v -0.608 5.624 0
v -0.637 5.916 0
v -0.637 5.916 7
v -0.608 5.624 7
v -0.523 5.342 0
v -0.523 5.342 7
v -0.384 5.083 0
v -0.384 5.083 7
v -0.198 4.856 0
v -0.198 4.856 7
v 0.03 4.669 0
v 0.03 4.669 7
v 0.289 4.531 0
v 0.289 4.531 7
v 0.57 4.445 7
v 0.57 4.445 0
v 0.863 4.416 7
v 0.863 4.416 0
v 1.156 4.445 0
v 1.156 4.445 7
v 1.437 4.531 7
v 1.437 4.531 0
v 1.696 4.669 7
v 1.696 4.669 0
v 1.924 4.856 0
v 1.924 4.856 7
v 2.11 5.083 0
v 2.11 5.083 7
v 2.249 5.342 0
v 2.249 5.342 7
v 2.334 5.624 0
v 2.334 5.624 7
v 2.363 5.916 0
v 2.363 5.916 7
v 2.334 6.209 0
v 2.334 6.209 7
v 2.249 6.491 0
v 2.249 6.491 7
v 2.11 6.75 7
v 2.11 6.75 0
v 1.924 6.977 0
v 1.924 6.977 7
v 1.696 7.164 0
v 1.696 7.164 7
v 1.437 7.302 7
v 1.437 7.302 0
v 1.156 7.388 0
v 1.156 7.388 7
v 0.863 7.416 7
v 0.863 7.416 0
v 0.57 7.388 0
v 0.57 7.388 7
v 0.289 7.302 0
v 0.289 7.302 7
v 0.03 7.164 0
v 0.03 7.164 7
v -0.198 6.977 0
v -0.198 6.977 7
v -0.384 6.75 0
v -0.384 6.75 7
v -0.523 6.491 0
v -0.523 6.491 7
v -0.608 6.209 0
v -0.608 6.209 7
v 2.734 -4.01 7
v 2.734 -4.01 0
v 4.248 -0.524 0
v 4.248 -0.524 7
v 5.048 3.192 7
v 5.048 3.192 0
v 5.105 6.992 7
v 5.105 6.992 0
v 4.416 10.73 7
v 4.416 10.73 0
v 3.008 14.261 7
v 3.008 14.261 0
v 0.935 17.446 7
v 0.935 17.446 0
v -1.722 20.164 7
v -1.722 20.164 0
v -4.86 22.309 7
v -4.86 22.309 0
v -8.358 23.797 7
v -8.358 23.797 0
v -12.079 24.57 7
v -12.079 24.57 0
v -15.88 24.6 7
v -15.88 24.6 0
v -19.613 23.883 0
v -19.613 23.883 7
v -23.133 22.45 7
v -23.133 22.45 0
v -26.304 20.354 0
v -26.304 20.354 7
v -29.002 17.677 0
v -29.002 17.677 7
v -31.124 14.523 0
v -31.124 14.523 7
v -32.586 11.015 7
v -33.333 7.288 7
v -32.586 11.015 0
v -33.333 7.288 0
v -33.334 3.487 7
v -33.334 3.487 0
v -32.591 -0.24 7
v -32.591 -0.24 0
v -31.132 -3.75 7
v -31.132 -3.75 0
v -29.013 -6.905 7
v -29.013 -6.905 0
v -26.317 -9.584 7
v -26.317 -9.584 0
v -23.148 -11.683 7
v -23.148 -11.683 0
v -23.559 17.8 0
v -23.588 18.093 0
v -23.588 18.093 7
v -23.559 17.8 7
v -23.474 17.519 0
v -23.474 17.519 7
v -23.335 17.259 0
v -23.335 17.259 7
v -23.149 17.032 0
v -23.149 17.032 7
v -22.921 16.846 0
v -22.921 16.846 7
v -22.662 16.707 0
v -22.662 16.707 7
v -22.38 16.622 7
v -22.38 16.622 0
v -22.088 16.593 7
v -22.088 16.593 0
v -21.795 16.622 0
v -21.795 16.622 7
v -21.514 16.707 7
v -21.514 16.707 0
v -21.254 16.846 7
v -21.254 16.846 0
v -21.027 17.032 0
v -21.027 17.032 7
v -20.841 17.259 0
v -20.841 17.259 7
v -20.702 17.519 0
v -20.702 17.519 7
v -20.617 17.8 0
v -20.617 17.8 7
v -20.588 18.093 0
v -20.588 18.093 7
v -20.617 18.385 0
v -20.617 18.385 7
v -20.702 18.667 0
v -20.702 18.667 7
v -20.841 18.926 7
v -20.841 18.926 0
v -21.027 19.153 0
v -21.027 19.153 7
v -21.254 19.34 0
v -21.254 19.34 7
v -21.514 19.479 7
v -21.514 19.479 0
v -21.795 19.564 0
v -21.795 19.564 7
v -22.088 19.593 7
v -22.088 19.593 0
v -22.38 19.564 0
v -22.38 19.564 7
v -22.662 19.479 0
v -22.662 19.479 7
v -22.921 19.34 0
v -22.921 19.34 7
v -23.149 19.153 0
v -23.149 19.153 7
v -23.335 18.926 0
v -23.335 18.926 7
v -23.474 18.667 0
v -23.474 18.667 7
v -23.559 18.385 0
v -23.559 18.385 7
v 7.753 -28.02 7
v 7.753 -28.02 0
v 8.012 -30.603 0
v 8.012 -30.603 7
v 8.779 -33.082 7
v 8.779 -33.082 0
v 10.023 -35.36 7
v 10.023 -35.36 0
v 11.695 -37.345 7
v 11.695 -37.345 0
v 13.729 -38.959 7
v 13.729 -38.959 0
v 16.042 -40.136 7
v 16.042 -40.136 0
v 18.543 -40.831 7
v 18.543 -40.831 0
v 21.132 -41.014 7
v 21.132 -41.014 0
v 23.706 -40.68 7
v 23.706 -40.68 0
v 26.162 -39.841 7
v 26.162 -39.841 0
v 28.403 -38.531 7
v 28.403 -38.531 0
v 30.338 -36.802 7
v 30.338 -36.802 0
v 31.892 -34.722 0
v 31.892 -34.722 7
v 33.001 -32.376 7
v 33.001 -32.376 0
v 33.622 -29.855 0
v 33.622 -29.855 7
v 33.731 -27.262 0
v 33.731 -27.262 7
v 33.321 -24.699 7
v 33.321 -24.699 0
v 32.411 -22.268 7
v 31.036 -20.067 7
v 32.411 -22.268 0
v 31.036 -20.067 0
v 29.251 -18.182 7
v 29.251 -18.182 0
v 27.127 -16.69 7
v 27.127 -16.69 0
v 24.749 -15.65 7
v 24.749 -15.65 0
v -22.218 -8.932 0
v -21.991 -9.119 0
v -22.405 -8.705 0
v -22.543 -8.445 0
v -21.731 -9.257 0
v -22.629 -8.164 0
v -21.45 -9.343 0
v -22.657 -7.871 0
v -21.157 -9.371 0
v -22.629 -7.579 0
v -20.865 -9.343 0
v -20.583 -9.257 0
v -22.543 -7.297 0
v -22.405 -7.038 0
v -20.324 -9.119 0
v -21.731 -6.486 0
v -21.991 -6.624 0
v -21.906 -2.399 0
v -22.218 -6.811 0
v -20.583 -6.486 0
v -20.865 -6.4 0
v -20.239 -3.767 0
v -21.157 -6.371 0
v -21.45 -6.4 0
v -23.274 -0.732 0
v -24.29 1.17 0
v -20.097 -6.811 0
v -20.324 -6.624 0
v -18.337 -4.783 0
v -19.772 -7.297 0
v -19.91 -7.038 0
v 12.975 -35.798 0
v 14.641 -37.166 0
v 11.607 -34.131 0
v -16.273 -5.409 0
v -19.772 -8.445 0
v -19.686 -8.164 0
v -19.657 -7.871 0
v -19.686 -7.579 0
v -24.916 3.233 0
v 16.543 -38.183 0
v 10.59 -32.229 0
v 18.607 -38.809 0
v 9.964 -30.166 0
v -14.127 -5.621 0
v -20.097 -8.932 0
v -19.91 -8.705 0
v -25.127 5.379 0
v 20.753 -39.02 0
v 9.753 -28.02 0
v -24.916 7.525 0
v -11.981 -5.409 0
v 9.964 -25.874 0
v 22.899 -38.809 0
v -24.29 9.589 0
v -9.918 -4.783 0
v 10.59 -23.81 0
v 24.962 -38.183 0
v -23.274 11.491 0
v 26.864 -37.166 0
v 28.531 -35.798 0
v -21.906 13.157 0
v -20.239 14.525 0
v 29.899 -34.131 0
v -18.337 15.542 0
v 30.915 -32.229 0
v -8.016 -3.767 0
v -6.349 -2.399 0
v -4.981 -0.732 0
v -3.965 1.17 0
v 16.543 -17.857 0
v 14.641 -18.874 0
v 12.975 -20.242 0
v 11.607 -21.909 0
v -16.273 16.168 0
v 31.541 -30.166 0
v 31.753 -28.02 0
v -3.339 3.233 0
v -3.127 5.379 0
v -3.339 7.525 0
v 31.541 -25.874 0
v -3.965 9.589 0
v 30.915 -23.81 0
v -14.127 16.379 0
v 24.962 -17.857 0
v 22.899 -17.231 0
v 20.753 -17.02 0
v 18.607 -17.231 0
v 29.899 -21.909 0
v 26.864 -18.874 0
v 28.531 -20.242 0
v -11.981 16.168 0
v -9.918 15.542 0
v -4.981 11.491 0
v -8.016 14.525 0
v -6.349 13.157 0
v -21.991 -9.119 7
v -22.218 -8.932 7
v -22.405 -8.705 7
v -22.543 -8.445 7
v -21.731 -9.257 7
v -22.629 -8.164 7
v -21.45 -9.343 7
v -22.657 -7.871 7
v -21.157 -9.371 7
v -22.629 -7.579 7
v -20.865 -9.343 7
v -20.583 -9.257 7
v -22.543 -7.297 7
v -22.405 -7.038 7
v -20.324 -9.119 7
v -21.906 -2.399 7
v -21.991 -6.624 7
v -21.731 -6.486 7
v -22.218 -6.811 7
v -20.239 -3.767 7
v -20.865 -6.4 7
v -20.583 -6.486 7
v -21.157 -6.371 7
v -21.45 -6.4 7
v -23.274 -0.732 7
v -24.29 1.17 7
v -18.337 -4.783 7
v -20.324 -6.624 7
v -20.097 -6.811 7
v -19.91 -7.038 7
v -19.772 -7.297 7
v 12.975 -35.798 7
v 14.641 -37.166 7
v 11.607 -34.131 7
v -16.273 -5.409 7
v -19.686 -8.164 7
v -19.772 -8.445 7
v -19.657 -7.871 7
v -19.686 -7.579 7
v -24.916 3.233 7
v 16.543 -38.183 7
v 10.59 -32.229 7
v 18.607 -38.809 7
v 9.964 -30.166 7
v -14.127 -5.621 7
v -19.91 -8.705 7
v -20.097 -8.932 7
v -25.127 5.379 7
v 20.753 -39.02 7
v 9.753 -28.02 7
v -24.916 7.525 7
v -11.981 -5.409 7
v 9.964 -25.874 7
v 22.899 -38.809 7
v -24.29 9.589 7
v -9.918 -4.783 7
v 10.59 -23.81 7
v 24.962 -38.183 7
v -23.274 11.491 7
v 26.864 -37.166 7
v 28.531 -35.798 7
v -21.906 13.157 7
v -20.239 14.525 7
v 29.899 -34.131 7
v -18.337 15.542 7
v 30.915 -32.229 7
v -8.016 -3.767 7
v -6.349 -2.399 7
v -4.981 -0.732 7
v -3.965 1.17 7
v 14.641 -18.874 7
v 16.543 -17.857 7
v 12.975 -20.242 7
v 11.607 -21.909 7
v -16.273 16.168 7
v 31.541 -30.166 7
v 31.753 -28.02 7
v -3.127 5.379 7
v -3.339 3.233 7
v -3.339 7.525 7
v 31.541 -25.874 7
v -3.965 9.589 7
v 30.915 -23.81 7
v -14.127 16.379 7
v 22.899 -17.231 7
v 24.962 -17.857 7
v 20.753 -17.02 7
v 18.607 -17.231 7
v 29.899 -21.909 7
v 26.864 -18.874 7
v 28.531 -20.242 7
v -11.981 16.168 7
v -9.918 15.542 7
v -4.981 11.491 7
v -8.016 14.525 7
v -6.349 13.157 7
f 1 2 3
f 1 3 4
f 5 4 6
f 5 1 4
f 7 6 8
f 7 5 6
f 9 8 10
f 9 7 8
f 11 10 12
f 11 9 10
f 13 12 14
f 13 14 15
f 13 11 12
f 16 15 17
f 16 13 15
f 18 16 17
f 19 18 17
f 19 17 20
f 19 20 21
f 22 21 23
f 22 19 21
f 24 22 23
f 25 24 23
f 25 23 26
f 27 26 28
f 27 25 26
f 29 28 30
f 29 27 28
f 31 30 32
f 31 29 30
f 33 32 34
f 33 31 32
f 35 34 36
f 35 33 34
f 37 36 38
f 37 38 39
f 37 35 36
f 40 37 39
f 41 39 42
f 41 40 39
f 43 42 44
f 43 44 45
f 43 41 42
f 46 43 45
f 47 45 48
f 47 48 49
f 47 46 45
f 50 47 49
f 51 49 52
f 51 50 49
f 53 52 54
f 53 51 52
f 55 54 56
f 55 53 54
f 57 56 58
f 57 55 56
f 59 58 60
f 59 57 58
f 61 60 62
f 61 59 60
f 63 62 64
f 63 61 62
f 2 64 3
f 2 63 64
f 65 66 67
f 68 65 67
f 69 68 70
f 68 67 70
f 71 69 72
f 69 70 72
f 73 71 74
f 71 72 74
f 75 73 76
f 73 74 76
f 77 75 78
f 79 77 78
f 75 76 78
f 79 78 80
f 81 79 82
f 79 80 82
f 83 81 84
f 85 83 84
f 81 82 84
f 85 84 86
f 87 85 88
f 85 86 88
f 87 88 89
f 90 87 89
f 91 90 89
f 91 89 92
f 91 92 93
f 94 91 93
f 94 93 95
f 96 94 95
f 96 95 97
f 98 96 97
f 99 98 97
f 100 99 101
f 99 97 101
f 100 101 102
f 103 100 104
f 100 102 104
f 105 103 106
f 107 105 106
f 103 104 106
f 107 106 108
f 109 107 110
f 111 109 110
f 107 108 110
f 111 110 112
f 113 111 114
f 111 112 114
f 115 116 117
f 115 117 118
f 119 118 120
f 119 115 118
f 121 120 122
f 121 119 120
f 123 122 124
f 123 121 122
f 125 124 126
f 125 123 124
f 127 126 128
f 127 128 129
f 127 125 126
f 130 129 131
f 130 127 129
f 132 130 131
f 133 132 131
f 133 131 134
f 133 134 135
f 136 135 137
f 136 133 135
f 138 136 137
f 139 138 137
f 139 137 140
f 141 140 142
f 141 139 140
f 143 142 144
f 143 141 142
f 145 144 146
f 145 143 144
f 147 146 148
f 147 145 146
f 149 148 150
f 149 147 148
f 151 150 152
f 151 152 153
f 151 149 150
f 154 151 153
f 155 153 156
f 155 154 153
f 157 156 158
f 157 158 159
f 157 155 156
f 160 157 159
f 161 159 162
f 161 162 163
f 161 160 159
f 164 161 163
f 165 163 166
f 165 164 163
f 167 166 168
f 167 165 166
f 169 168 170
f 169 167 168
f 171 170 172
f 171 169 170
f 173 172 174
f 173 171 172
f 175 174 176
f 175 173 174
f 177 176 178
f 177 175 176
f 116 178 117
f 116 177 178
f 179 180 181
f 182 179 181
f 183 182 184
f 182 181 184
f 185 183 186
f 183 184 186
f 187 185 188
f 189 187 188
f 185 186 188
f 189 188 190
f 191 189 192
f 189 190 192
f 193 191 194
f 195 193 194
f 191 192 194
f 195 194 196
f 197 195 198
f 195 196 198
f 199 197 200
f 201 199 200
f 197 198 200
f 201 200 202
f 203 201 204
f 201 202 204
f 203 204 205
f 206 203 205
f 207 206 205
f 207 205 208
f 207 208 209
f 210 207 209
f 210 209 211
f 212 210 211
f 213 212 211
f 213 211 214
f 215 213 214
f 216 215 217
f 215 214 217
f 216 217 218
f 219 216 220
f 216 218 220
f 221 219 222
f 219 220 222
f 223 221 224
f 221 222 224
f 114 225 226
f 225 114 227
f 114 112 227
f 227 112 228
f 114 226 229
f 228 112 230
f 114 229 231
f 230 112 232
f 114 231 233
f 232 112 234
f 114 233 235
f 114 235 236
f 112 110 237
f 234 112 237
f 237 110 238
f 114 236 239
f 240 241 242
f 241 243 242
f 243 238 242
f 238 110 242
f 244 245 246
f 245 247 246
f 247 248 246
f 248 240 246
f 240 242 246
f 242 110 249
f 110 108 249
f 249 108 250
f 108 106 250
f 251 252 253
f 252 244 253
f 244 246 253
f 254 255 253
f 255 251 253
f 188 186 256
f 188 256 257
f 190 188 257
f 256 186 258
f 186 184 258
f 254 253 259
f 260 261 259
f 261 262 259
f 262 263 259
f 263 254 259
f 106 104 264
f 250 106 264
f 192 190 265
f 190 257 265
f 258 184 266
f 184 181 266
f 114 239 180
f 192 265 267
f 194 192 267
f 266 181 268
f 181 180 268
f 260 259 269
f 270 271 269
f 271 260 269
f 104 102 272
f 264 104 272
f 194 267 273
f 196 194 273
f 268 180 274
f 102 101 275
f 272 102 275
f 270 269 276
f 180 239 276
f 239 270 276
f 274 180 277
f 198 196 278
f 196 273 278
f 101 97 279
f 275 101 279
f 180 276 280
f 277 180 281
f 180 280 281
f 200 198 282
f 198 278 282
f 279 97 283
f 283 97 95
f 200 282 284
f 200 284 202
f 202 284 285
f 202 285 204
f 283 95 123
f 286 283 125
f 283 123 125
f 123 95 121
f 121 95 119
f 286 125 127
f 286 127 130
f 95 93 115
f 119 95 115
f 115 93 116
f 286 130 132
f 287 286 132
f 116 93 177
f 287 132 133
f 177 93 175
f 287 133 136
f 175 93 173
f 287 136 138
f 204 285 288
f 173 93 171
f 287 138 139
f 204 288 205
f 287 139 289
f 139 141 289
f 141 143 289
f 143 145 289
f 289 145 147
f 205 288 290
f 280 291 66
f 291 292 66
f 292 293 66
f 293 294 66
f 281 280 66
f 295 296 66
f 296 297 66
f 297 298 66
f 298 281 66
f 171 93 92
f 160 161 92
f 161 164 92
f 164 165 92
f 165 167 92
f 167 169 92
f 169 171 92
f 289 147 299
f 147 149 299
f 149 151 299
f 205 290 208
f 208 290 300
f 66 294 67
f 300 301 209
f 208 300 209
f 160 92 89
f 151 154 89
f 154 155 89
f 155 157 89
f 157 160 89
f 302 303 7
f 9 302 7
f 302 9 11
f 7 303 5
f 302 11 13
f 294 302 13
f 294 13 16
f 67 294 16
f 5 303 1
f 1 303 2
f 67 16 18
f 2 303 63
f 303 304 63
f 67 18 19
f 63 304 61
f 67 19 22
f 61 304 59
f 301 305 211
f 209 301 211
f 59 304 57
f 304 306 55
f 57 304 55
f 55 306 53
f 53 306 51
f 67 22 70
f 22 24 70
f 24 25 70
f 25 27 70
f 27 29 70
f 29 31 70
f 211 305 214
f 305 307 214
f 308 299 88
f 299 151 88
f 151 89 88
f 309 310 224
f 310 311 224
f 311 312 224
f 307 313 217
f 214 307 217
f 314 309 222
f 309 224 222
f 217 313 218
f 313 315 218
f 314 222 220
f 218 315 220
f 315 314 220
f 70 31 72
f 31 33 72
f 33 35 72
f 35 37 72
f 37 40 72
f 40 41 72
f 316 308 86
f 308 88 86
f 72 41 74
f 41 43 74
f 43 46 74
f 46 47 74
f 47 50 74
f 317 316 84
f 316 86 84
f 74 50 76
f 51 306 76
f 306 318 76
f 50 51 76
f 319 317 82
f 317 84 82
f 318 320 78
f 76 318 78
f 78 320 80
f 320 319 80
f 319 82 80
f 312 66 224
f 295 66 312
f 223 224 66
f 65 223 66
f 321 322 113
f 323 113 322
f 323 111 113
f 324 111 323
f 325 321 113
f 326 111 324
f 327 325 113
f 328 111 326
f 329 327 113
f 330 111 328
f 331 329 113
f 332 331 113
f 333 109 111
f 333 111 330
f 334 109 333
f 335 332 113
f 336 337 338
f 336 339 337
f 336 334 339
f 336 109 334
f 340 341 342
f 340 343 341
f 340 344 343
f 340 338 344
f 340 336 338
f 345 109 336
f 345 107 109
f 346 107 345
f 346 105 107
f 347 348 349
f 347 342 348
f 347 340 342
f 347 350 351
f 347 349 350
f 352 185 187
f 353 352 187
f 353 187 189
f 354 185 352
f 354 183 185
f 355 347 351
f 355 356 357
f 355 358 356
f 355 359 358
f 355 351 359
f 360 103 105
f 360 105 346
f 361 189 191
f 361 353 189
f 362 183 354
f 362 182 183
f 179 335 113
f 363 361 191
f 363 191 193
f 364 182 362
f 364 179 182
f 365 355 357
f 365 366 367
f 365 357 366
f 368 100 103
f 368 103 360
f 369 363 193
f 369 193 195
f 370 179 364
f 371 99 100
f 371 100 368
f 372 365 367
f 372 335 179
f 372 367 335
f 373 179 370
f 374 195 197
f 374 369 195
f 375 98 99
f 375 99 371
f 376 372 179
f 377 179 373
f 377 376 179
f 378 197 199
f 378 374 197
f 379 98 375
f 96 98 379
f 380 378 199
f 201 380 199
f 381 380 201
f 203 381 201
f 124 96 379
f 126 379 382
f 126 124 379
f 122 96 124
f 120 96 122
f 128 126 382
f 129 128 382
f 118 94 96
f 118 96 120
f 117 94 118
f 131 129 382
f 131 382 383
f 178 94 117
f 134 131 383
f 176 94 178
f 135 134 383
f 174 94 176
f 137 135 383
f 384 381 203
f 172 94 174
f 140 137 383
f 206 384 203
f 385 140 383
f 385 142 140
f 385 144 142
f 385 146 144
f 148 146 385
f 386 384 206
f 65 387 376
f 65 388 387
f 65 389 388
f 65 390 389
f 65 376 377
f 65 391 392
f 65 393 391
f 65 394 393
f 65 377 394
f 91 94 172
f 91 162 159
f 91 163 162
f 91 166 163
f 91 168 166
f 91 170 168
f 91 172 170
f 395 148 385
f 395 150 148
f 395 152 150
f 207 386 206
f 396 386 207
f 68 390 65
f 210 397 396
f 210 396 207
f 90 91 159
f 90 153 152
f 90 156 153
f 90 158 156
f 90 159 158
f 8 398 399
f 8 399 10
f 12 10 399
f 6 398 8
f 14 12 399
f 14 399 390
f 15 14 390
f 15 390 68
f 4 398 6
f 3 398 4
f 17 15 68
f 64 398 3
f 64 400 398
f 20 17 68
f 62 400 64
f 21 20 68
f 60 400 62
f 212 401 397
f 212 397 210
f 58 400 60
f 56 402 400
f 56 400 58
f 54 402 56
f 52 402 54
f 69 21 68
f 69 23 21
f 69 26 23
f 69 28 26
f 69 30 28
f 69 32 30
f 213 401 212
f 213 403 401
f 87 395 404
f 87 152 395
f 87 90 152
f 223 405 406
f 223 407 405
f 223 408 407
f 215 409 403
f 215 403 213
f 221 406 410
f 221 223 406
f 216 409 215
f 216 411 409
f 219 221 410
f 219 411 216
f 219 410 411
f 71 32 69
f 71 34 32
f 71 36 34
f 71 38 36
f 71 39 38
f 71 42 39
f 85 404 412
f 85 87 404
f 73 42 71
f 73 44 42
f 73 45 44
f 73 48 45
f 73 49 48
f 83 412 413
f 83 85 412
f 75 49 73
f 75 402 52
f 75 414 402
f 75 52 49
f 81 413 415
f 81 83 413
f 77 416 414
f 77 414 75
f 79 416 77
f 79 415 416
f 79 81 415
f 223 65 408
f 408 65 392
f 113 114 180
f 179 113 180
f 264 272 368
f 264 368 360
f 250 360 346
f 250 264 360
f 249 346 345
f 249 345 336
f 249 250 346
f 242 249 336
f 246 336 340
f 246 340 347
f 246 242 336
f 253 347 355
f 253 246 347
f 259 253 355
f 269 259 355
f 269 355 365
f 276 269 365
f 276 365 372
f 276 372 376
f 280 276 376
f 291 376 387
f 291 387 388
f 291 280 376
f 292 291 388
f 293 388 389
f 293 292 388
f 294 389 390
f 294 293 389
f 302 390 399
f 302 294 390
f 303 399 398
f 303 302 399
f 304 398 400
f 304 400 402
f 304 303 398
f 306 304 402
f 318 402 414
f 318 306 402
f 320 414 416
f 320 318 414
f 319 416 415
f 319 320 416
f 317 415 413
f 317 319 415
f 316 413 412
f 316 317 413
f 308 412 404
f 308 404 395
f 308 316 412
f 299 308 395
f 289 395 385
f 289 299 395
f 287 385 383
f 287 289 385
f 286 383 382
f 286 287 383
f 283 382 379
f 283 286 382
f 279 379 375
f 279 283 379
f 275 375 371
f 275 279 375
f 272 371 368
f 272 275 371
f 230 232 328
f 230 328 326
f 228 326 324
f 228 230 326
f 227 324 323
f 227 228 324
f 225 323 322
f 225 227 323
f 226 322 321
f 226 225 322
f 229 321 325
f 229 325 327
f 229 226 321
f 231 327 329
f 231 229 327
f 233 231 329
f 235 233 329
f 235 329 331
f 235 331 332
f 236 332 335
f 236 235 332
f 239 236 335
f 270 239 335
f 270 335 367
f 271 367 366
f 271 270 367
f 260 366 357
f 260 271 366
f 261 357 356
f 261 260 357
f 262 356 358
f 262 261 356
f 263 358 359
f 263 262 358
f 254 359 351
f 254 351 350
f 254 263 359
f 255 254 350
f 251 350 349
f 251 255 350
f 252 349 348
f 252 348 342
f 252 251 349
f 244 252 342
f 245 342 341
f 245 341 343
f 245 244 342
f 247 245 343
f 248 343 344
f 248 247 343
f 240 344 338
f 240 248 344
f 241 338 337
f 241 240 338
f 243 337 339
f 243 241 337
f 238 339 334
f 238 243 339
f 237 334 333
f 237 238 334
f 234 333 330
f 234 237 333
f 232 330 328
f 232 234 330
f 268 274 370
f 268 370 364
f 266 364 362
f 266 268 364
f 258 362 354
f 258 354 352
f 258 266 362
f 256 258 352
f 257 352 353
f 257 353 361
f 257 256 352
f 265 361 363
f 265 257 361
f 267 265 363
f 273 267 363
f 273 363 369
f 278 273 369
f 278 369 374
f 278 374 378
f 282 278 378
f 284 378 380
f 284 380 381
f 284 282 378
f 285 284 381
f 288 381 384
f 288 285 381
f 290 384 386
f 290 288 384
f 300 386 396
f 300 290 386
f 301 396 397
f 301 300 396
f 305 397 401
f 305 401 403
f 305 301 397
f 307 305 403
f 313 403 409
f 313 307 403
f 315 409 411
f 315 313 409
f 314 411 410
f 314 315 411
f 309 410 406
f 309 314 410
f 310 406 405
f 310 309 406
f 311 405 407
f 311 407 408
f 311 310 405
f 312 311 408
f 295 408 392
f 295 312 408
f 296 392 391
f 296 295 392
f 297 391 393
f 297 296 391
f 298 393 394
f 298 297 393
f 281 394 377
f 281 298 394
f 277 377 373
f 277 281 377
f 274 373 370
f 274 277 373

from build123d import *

# Parameters (mm, degrees)
SKETCH1_R           = 1.5
SKETCH1_R_2         = 11
BOSS_EXTRUDE1_DEPTH = 7


with BuildPart() as part:
    # Sketch1 → Boss-Extrude1 (new body)
    with BuildSketch(Plane.XY):
        with BuildLine():
            Line((24.749447939, -15.649541482), (2.734486559, -4.010388703))
            ThreePointArc((2.734486559, -4.010388703), (-19.612688755, 23.883391477), (-23.148073161, -11.682888541))
            Line((-23.148073161, -11.682888541), (7.752714707, -28.019914292))
            ThreePointArc((7.752714707, -28.019914292), (28.40263196, -38.530802267), (24.749447939, -15.649541482))
        make_face()
        with Locations(Location((0.862954929, 5.91648973, 0), (0, 0, 180))):
            Circle(SKETCH1_R, mode=Mode.SUBTRACT)
        with Locations(Location((-21.15738061, -7.87136082, 0), (0, 0, 180))):
            Circle(SKETCH1_R, mode=Mode.SUBTRACT)
        with Locations(Location((-14.127422454, 5.37928778, 0), (0, 0, 180))):
            Circle(SKETCH1_R_2, mode=Mode.SUBTRACT)
        with Locations(Location((-22.08784168, 18.092734431, 0), (0, 0, 180))):
            Circle(SKETCH1_R, mode=Mode.SUBTRACT)
        with Locations(Location((20.752714707, -28.019914292, 0), (0, 0, 180))):
            Circle(SKETCH1_R_2, mode=Mode.SUBTRACT)
    extrude(amount=BOSS_EXTRUDE1_DEPTH)


solid = part.part
